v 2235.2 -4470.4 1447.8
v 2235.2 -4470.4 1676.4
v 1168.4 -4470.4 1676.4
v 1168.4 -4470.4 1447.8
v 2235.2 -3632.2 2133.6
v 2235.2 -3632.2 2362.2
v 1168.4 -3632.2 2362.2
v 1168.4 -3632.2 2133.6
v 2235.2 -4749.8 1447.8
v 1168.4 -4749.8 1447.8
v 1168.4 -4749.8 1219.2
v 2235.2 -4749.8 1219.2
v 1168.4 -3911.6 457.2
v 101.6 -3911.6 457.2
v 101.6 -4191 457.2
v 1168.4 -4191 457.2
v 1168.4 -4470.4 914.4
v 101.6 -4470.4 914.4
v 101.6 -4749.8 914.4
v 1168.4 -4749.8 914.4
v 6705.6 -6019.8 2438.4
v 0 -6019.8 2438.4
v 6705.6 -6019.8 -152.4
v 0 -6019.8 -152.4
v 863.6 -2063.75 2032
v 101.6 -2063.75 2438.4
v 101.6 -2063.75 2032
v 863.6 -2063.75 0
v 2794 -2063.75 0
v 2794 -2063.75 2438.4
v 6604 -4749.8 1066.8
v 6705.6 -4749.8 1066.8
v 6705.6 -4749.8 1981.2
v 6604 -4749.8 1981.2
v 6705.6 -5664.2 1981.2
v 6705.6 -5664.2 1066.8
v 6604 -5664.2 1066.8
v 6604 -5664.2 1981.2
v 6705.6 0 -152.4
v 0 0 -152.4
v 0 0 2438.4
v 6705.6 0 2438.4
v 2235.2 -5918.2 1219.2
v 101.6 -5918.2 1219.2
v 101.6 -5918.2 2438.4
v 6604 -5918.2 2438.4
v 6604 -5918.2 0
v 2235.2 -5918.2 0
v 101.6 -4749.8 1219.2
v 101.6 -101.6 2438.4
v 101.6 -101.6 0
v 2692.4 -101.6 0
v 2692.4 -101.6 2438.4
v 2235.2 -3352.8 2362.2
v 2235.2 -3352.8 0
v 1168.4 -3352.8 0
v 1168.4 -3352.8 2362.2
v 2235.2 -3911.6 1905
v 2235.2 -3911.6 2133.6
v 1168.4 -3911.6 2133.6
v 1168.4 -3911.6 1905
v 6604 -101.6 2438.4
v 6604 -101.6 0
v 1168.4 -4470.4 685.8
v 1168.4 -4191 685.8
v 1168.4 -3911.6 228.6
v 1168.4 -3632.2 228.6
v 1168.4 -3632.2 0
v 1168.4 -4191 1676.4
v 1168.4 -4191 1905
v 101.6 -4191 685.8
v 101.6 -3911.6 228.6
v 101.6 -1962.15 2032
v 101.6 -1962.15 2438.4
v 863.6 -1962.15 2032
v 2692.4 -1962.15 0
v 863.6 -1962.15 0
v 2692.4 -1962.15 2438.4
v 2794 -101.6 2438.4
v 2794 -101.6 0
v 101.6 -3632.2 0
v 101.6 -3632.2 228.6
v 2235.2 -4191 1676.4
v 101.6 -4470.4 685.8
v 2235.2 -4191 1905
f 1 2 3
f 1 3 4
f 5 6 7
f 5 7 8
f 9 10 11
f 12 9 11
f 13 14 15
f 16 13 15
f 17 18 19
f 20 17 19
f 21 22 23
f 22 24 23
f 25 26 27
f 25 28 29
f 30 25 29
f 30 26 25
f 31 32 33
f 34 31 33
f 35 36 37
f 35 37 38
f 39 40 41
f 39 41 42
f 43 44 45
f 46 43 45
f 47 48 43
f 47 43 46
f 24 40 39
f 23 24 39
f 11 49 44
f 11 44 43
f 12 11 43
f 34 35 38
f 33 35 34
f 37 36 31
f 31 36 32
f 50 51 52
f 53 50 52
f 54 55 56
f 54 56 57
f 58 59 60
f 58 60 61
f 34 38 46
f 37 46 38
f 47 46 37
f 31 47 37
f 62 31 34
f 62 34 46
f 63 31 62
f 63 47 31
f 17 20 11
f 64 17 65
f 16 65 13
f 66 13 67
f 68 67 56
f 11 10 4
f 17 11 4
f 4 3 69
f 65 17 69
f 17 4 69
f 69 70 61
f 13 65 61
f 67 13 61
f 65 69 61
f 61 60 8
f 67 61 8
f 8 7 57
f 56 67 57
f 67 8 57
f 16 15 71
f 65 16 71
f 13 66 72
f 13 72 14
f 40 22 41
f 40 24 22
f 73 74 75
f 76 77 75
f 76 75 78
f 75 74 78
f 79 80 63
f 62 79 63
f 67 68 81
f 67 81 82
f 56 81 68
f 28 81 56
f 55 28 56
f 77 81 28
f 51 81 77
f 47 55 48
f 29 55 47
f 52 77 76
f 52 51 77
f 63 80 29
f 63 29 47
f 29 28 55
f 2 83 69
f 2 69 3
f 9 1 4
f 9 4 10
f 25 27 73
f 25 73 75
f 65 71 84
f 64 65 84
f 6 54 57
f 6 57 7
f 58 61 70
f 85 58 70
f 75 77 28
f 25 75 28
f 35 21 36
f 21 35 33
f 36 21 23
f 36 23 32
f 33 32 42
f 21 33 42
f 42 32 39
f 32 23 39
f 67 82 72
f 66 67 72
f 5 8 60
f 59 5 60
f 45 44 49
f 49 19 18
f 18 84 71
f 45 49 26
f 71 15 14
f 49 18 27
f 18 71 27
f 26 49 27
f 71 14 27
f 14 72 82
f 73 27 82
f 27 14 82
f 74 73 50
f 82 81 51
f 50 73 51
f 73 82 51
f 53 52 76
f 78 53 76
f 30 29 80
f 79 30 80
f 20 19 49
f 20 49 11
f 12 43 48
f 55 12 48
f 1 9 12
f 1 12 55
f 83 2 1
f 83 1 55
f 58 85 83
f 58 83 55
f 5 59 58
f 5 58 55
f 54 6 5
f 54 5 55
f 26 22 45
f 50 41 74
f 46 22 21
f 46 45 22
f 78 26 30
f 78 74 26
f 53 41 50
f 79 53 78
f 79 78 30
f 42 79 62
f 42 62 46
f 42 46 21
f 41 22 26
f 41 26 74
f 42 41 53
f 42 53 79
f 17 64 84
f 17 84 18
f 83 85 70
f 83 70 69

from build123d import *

# Parameters (mm, degrees)
F0_W      = 6705.6
F0_H      = 6019.8
F1_DEPTH  = 152.4
F2_W      = 6705.6
F2_H      = 6019.8
F2_W_2    = 6502.4
F2_H_2    = 5816.6
F3_DEPTH  = 2438.4
F5_DEPTH  = 2438.4
F6_W      = 914.4
F6_H      = 914.4
F7_DEPTH  = 127
F8_W      = 762
F8_H      = 406.4
F9_DEPTH  = 101.6
F10_W     = 2133.6
F10_H     = 1168.4
F11_DEPTH = 1219.2
F13_DEPTH = 1066.8
F15_DEPTH = 1066.8


with BuildPart() as f1:
    # F0 (on Top) → F1 (new body)
    with BuildSketch(Plane.XY):
        with Locations((3352.8, -3009.9)):
            Rectangle(F0_W, F0_H)
    extrude(amount=-F1_DEPTH)

    # F2 (on face) → F3 (join)
    with BuildSketch(Plane.XY):
        with Locations((3352.8, -3009.9)):
            Rectangle(F2_W, F2_H)
        with Locations((3352.8, -3009.9)):
            Rectangle(F2_W_2, F2_H_2, mode=Mode.SUBTRACT)
    extrude(amount=F3_DEPTH)

    # F4 (on face) → F5 (join)
    with BuildSketch(Plane.XY):
        Polygon((2692.4, -1962.15), (863.6, -1962.15), (863.6, -2063.75), (2794, -2063.75), (2794, -101.6), (2692.4, -101.6), align=None)
    extrude(amount=F5_DEPTH)

    # F6 (on face) → F7 (cut)
    with BuildSketch(Plane.YZ.offset(6705.6)):
        with Locations((-5207, 1524)):
            Rectangle(F6_W, F6_H)
    extrude(amount=-F7_DEPTH, mode=Mode.SUBTRACT)

    # F8 (on face) → F9 (join, through all)
    with BuildSketch(Plane.XZ.offset(2063.75)):
        with Locations((482.6, 2235.2)):
            Rectangle(F8_W, F8_H)
    extrude(amount=-F9_DEPTH)

    # F10 (on face) → F11 (join)
    with BuildSketch(Plane.XY):
        with Locations((1168.4, -5334)):
            Rectangle(F10_W, F10_H)
    extrude(amount=F11_DEPTH)

    # F12 (on face) → F13 (join)
    with BuildSketch(Plane.YZ.offset(101.6)):
        Polygon((-4749.8, 0), (-3632.2, 0), (-3632.2, 228.6), (-3911.6, 228.6), (-3911.6, 457.2), (-4191, 457.2), (-4191, 685.8), (-4470.4, 685.8), (-4470.4, 914.4), (-4749.8, 914.4), align=None)
    extrude(amount=F13_DEPTH)

    # F14 (on face) → F15 (join)
    with BuildSketch(Plane.YZ.offset(2235.2)):
        Polygon((-4749.8, 1447.8), (-4749.8, 1219.2), (-4749.8, 0), (-3352.8, 0), (-3352.8, 2362.2), (-3632.2, 2362.2), (-3632.2, 2133.6), (-3911.6, 2133.6), (-3911.6, 1905), (-4191, 1905), (-4191, 1676.4), (-4470.4, 1676.4), (-4470.4, 1447.8), align=None)
    extrude(amount=-F15_DEPTH)


solid = f1.part
